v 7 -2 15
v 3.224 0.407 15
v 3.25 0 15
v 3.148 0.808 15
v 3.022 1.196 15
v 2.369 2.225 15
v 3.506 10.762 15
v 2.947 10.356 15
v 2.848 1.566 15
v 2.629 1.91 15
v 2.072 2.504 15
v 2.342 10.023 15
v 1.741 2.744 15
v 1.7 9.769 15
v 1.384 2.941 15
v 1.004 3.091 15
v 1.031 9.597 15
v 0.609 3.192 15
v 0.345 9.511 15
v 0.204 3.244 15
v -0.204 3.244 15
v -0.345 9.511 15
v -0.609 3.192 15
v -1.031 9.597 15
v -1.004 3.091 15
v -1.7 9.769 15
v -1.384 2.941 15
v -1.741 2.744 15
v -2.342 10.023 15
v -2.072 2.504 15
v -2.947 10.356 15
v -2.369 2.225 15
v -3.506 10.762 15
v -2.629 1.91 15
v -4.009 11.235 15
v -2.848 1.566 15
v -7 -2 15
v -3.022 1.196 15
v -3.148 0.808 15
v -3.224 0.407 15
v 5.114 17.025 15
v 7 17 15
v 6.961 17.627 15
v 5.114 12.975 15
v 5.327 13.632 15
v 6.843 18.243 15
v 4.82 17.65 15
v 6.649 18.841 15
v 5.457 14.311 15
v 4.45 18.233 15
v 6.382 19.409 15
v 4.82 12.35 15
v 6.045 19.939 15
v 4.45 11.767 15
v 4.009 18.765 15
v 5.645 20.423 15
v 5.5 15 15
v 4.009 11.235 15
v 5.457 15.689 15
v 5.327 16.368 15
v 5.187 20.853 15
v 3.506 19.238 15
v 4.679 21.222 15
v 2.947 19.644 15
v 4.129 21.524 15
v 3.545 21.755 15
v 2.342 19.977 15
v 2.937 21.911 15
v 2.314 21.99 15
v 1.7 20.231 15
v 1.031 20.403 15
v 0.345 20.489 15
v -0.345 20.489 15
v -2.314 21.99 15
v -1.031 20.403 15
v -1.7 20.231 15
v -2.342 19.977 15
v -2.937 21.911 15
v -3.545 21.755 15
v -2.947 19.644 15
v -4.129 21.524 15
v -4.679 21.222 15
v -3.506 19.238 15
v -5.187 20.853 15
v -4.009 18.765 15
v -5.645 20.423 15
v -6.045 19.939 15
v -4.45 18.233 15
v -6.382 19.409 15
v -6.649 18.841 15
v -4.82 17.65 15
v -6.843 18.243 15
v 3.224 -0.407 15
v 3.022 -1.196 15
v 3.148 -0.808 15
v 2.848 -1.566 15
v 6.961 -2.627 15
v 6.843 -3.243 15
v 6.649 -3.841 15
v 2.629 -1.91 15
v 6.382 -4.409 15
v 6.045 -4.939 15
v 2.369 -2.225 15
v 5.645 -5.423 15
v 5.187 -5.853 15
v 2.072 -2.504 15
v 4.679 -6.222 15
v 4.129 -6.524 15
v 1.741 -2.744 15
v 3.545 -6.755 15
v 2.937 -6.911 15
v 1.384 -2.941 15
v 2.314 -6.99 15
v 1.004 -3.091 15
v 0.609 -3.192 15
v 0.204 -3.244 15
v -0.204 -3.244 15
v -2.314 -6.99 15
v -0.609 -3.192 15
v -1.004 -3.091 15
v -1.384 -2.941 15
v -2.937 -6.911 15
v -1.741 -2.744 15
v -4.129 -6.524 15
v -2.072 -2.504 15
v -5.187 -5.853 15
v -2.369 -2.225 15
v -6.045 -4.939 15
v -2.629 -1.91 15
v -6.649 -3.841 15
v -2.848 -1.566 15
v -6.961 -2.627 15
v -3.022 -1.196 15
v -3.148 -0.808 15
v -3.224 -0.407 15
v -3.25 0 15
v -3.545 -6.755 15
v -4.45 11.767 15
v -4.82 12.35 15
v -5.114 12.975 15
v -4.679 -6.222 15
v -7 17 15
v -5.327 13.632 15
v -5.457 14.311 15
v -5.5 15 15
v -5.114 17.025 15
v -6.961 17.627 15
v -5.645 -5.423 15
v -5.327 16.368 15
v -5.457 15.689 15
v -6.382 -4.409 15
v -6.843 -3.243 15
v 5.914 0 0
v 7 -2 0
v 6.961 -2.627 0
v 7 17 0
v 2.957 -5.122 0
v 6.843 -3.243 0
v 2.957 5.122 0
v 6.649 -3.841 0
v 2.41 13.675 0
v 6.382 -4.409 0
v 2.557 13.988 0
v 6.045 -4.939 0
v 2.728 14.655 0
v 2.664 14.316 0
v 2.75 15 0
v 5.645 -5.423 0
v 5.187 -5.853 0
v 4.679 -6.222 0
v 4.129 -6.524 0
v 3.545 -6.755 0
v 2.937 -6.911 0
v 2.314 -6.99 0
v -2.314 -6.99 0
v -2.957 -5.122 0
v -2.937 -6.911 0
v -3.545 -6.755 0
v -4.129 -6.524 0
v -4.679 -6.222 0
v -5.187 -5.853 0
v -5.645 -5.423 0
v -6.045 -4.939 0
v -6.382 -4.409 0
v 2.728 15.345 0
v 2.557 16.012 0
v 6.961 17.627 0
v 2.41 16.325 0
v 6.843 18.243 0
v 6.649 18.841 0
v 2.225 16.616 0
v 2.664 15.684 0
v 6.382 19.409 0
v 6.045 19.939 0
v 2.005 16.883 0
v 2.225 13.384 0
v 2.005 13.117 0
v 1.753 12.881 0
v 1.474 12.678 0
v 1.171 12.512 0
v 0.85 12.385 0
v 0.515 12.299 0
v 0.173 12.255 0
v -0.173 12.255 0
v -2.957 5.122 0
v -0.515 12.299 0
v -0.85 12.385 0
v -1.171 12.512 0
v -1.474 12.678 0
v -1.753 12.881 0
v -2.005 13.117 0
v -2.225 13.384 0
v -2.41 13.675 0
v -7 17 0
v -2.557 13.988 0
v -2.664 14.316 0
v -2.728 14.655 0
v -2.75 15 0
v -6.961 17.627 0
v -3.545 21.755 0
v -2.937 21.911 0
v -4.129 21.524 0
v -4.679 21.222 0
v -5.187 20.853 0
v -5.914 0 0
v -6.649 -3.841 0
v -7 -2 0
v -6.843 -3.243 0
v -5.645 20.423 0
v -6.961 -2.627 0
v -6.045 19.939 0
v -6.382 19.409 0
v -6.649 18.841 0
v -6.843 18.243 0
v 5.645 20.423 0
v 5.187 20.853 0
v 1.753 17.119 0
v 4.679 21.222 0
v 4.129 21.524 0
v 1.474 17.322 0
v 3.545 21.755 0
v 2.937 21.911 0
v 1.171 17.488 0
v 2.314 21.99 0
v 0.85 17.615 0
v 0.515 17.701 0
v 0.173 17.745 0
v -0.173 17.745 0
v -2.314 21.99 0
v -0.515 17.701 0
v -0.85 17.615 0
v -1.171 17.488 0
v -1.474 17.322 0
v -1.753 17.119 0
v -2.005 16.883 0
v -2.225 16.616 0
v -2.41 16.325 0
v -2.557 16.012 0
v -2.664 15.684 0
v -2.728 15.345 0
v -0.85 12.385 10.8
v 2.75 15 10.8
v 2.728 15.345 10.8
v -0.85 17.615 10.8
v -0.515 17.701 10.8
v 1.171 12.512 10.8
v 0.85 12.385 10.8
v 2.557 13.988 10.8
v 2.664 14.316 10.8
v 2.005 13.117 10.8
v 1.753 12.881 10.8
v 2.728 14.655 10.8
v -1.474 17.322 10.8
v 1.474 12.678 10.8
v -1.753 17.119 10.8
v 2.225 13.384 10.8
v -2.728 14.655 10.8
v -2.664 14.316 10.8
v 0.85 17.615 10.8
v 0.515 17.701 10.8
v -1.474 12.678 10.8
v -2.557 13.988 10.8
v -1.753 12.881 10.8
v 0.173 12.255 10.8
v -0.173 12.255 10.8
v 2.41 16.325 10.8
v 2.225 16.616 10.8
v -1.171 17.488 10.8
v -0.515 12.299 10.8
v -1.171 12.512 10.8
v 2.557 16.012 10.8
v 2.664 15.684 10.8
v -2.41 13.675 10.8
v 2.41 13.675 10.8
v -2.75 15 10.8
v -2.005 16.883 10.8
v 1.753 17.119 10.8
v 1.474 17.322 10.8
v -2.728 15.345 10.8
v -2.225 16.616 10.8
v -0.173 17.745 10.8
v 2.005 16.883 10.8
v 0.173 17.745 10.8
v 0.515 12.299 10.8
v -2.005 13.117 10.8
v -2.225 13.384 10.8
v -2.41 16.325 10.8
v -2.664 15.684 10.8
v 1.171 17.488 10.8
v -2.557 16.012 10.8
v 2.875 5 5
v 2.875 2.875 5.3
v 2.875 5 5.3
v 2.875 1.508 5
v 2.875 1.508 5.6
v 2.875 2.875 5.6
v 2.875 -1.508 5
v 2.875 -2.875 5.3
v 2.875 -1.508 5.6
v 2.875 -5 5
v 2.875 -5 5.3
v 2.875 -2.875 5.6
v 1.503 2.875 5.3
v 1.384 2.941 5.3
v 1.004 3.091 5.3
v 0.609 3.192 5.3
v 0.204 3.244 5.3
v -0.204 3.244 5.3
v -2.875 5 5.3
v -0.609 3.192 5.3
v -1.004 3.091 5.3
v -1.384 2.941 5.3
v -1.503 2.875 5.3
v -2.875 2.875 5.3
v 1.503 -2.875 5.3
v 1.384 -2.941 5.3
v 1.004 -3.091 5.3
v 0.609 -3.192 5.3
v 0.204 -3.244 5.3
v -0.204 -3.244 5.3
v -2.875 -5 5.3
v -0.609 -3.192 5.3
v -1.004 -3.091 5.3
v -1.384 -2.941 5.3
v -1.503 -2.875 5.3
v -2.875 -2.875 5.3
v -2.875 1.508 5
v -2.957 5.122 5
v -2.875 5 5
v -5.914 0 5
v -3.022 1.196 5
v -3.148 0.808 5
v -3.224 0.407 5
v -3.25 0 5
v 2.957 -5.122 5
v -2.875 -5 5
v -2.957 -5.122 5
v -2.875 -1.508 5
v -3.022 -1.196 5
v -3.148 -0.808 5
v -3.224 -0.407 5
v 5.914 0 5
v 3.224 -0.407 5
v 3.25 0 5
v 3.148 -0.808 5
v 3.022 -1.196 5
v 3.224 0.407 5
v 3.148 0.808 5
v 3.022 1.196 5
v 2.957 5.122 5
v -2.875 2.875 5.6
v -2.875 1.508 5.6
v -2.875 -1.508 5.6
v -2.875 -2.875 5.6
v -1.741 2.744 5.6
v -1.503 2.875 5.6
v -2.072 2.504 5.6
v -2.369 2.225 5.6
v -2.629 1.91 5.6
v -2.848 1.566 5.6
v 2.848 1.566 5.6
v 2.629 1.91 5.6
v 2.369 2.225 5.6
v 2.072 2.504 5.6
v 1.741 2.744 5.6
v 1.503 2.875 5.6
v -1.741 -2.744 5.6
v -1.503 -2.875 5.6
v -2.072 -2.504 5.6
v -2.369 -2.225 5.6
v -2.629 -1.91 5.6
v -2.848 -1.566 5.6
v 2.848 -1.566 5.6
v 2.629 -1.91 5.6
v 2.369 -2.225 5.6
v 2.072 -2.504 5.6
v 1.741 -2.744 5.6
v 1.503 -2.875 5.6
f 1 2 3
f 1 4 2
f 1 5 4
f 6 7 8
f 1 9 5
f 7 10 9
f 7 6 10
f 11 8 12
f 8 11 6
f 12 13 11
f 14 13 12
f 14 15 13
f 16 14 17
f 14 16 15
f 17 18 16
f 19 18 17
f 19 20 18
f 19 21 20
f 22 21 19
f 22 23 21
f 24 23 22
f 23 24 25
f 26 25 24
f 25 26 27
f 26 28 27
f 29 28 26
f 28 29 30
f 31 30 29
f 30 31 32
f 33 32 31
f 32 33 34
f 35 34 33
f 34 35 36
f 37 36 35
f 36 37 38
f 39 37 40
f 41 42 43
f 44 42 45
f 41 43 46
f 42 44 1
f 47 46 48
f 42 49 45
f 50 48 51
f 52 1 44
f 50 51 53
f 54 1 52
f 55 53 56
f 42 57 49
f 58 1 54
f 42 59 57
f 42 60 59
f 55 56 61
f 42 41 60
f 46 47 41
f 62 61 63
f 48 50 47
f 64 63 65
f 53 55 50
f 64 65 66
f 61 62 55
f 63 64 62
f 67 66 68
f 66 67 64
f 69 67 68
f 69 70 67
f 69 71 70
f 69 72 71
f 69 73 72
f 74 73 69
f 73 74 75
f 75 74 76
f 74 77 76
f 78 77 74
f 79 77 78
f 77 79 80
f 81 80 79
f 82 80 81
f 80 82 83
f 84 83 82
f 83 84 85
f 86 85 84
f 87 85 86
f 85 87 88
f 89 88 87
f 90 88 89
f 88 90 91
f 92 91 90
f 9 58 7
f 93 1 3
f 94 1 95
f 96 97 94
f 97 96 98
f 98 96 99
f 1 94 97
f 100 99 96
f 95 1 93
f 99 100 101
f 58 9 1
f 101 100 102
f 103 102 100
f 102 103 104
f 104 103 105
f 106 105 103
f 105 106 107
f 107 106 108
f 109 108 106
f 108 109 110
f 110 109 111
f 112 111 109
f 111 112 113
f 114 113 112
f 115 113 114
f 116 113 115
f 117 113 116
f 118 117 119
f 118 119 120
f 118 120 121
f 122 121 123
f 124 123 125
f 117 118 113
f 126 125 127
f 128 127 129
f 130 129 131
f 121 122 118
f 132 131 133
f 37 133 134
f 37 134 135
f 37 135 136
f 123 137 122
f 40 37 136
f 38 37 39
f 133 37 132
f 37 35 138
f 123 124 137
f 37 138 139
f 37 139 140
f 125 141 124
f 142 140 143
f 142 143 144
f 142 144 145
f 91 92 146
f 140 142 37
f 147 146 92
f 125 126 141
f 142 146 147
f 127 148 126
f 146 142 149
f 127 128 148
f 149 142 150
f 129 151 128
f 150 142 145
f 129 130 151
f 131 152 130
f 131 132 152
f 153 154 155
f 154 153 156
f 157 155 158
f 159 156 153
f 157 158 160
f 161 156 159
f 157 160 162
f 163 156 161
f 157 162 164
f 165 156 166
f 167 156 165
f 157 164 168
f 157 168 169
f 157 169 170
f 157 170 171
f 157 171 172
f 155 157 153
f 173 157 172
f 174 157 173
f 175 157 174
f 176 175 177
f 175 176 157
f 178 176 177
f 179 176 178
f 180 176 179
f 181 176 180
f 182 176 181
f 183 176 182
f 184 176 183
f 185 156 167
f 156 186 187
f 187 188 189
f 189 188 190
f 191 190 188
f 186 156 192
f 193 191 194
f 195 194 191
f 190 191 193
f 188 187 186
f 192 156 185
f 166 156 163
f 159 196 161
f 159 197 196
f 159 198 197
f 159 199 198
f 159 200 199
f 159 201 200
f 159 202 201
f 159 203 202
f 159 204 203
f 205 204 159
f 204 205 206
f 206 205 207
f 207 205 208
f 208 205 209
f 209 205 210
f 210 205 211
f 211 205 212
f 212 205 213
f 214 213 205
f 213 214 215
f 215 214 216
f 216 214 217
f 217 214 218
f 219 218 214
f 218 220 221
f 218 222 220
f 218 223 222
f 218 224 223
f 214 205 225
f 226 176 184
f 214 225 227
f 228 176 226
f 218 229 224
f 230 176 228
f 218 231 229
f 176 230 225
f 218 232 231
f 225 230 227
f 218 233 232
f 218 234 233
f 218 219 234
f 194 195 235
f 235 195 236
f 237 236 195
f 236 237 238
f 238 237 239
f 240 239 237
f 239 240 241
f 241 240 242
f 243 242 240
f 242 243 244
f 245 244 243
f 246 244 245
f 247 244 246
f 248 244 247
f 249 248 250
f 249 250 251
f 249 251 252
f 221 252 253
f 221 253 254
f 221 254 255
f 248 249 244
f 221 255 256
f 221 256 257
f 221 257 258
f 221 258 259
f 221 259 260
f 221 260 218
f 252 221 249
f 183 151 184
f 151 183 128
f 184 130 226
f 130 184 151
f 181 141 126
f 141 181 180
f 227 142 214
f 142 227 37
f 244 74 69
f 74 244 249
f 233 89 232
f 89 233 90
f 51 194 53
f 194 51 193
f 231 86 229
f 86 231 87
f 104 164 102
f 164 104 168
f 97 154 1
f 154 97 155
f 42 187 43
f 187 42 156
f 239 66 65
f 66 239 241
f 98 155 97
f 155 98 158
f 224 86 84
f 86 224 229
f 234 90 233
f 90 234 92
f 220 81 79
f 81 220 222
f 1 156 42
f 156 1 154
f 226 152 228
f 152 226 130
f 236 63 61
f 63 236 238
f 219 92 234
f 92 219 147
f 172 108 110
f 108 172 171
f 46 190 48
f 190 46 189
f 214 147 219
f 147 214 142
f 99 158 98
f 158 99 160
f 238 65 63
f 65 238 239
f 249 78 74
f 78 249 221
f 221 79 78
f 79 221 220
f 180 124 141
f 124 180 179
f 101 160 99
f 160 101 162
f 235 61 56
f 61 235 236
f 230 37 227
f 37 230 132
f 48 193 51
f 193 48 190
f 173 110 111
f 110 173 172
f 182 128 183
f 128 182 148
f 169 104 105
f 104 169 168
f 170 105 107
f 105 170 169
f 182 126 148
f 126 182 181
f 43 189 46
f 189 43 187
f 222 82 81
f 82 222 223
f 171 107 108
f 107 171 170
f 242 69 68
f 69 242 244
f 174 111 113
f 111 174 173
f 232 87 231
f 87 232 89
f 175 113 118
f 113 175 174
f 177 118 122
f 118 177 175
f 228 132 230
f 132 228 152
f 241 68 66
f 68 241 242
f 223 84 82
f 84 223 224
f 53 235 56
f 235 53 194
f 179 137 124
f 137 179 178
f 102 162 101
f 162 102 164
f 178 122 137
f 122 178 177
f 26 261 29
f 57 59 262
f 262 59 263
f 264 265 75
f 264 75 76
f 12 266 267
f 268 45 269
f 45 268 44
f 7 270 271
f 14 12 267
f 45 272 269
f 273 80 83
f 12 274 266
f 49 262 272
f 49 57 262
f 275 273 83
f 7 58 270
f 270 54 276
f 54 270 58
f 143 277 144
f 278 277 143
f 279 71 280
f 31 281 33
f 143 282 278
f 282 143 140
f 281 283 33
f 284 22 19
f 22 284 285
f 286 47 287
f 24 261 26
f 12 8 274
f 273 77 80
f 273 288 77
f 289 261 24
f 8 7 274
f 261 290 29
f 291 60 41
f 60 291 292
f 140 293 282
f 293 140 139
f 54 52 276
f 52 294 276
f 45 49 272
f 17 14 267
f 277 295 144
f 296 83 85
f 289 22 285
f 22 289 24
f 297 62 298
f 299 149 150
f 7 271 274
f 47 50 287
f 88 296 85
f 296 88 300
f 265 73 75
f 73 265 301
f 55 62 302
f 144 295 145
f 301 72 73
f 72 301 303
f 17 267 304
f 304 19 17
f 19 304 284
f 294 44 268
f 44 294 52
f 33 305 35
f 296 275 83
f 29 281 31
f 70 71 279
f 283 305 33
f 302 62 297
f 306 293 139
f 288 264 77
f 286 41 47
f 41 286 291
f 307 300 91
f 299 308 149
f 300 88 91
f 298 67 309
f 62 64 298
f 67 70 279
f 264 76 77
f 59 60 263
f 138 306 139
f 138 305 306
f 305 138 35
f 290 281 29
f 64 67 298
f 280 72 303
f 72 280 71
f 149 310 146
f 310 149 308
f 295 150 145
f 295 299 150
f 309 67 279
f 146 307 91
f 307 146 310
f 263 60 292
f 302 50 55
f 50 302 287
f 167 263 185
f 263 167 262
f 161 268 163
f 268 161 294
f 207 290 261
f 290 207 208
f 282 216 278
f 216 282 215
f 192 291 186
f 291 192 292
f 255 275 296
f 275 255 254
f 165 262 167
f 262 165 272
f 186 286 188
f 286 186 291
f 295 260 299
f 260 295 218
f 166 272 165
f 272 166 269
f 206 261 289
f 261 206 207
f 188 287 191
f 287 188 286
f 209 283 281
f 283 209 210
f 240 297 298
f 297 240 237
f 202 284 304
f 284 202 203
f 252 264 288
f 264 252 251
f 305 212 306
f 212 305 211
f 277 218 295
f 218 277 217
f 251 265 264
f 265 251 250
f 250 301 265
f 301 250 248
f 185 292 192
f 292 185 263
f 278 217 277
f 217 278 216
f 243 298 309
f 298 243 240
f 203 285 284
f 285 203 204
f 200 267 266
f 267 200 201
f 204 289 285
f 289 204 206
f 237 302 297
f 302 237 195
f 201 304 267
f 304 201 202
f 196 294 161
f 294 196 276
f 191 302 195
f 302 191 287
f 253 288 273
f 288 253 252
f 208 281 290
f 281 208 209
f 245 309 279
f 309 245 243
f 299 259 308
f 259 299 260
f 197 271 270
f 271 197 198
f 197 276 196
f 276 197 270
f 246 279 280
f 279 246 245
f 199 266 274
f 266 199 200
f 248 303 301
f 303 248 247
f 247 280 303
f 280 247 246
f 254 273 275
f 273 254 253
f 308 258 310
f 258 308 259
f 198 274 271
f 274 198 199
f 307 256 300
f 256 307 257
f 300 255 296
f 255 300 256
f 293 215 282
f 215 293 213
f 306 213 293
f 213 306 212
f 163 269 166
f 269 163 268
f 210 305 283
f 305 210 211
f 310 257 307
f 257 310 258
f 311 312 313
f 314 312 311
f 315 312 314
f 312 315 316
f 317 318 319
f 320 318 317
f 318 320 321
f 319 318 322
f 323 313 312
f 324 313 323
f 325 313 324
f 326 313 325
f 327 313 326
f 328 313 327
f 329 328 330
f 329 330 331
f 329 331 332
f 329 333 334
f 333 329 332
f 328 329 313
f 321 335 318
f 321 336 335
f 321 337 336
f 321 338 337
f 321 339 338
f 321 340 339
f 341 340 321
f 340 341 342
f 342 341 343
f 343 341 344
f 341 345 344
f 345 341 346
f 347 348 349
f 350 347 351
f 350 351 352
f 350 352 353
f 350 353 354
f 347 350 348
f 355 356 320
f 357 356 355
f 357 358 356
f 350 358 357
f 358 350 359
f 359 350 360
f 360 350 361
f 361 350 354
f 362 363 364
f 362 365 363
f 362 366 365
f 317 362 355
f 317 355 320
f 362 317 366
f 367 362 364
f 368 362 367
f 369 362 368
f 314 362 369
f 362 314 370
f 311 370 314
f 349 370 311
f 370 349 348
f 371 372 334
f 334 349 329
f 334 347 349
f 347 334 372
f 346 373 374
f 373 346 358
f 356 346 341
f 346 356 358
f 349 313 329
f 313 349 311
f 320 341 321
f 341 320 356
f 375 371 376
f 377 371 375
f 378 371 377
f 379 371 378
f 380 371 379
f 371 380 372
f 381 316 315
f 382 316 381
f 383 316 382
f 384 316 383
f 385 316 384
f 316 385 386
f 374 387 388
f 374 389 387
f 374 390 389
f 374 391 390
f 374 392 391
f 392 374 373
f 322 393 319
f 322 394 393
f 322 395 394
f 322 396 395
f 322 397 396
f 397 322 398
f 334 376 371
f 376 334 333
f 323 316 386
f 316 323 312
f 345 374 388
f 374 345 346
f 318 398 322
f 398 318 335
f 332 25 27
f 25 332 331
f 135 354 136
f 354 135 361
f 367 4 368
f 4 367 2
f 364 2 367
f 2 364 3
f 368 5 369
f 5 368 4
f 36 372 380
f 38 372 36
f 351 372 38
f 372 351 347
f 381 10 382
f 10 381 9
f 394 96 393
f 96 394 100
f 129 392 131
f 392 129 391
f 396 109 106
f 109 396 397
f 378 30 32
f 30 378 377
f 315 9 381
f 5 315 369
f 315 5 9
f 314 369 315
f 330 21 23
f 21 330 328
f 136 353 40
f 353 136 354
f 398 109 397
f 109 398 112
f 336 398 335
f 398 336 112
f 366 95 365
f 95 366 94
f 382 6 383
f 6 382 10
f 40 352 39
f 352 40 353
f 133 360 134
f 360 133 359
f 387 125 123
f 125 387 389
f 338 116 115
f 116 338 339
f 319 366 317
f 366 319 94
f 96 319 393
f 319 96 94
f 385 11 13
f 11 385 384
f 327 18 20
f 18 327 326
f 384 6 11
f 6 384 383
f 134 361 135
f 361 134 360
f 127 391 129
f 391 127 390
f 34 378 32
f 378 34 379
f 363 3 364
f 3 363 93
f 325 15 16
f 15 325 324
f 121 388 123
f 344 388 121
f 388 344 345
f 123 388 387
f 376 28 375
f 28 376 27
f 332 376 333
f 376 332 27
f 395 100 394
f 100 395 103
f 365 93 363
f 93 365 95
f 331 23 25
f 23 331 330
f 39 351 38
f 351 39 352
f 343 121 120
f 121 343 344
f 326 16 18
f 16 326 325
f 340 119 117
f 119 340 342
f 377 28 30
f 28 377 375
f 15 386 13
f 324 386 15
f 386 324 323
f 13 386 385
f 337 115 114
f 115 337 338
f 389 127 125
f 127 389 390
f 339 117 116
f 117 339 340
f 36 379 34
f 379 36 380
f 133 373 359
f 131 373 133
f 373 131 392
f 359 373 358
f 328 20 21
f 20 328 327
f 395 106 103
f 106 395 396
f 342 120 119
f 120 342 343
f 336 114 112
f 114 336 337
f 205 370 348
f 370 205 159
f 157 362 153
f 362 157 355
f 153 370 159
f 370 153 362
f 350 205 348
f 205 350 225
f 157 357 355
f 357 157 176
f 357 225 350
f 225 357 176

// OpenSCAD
$fn = 50;


difference() {
	union() {
		cylinder(h = 15, r = 7.0000000000);
		translate(v = [0.0000000000, 7.5000000000, 0]) {
			hull() {
				translate(v = [-2.0000000000, 9.5000000000, 0]) {
					cylinder(h = 15, r = 5);
				}
				translate(v = [2.0000000000, 9.5000000000, 0]) {
					cylinder(h = 15, r = 5);
				}
				translate(v = [-2.0000000000, -9.5000000000, 0]) {
					cylinder(h = 15, r = 5);
				}
				translate(v = [2.0000000000, -9.5000000000, 0]) {
					cylinder(h = 15, r = 5);
				}
			}
		}
		translate(v = [0.0000000000, 7.5000000000, 0]) {
			hull() {
				translate(v = [-2.0000000000, 9.5000000000, 0]) {
					cylinder(h = 15, r = 5);
				}
				translate(v = [2.0000000000, 9.5000000000, 0]) {
					cylinder(h = 15, r = 5);
				}
				translate(v = [-2.0000000000, -9.5000000000, 0]) {
					cylinder(h = 15, r = 5);
				}
				translate(v = [2.0000000000, -9.5000000000, 0]) {
					cylinder(h = 15, r = 5);
				}
			}
		}
	}
	union() {
		translate(v = [0.0000000000, 15.0000000000, 15]) {
			rotate(a = [0, 0, 0]) {
				difference() {
					union() {
						#translate(v = [0, 0, -15.0000000000]) {
							cylinder(h = 15, r = 2.2500000000);
						}
						#translate(v = [0, 0, -4.2000000000]) {
							cylinder(h = 4.2000000000, r1 = 2.7500000000, r2 = 5.5000000000);
						}
						#translate(v = [0, 0, -15.0000000000]) {
							cylinder(h = 15, r = 2.7500000000);
						}
						#translate(v = [0, 0, -15.0000000000]) {
							cylinder(h = 15, r = 2.2500000000);
						}
					}
					union();
				}
			}
		}
		translate(v = [0.0000000000, 15.0000000000, 15]) {
			rotate(a = [0, 0, 0]) {
				difference() {
					union() {
						#translate(v = [0, 0, -15.0000000000]) {
							cylinder(h = 15, r = 2.2500000000);
						}
						#translate(v = [0, 0, -4.2000000000]) {
							cylinder(h = 4.2000000000, r1 = 2.7500000000, r2 = 5.5000000000);
						}
						#translate(v = [0, 0, -15.0000000000]) {
							cylinder(h = 15, r = 2.7500000000);
						}
						#translate(v = [0, 0, -15.0000000000]) {
							cylinder(h = 15, r = 2.2500000000);
						}
					}
					union();
				}
			}
		}
		translate(v = [0.0000000000, 0.0000000000, 0]) {
			rotate(a = [0, 0, 0]) {
				difference() {
					union() {
						#translate(v = [-2.8750000000, -5.0000000000, -0.3000000000]) {
							cube(size = [5.7500000000, 10, 0.3000000000]);
						}
						#translate(v = [-2.8750000000, -2.8750000000, -0.6000000000]) {
							cube(size = [5.7500000000, 5.7500000000, 0.3000000000]);
						}
						#translate(v = [-2.8750000000, -5.0000000000, 5]) {
							cube(size = [5.7500000000, 10, 0.3000000000]);
						}
						#translate(v = [-2.8750000000, -2.8750000000, 5.3000000000]) {
							cube(size = [5.7500000000, 5.7500000000, 0.3000000000]);
						}
						#translate(v = [0, 0, -100.0000000000]) {
							cylinder(h = 200, r = 3.2500000000);
						}
						#linear_extrude(height = 5) {
							polygon(points = [[5.9142500000, 0.0000000000], [2.9571250000, 5.1218907443], [-2.9571250000, 5.1218907443], [-5.9142500000, 0.0000000000], [-2.9571250000, -5.1218907443], [2.9571250000, -5.1218907443]]);
						}
						#translate(v = [-2.8750000000, -5.0000000000, -0.3000000000]) {
							cube(size = [5.7500000000, 10, 0.3000000000]);
						}
						#translate(v = [-2.8750000000, -2.8750000000, -0.6000000000]) {
							cube(size = [5.7500000000, 5.7500000000, 0.3000000000]);
						}
						#translate(v = [-2.8750000000, -5.0000000000, 5]) {
							cube(size = [5.7500000000, 10, 0.3000000000]);
						}
						#translate(v = [-2.8750000000, -2.8750000000, 5.3000000000]) {
							cube(size = [5.7500000000, 5.7500000000, 0.3000000000]);
						}
						#translate(v = [0, 0, -100.0000000000]) {
							cylinder(h = 200, r = 3.2500000000);
						}
						#translate(v = [-2.8750000000, -5.0000000000, -0.3000000000]) {
							cube(size = [5.7500000000, 10, 0.3000000000]);
						}
						#translate(v = [-2.8750000000, -2.8750000000, -0.6000000000]) {
							cube(size = [5.7500000000, 5.7500000000, 0.3000000000]);
						}
						#translate(v = [-2.8750000000, -5.0000000000, 5]) {
							cube(size = [5.7500000000, 10, 0.3000000000]);
						}
						#translate(v = [-2.8750000000, -2.8750000000, 5.3000000000]) {
							cube(size = [5.7500000000, 5.7500000000, 0.3000000000]);
						}
						#translate(v = [0, 0, -100.0000000000]) {
							cylinder(h = 200, r = 3.2500000000);
						}
					}
					union();
				}
			}
		}
		translate(v = [0, 0, -100]) {
			cylinder(h = 200, r = 3.2500000000);
		}
		translate(v = [0, 0, -100]) {
			cylinder(h = 200, r = 1.8000000000);
		}
	}
}
